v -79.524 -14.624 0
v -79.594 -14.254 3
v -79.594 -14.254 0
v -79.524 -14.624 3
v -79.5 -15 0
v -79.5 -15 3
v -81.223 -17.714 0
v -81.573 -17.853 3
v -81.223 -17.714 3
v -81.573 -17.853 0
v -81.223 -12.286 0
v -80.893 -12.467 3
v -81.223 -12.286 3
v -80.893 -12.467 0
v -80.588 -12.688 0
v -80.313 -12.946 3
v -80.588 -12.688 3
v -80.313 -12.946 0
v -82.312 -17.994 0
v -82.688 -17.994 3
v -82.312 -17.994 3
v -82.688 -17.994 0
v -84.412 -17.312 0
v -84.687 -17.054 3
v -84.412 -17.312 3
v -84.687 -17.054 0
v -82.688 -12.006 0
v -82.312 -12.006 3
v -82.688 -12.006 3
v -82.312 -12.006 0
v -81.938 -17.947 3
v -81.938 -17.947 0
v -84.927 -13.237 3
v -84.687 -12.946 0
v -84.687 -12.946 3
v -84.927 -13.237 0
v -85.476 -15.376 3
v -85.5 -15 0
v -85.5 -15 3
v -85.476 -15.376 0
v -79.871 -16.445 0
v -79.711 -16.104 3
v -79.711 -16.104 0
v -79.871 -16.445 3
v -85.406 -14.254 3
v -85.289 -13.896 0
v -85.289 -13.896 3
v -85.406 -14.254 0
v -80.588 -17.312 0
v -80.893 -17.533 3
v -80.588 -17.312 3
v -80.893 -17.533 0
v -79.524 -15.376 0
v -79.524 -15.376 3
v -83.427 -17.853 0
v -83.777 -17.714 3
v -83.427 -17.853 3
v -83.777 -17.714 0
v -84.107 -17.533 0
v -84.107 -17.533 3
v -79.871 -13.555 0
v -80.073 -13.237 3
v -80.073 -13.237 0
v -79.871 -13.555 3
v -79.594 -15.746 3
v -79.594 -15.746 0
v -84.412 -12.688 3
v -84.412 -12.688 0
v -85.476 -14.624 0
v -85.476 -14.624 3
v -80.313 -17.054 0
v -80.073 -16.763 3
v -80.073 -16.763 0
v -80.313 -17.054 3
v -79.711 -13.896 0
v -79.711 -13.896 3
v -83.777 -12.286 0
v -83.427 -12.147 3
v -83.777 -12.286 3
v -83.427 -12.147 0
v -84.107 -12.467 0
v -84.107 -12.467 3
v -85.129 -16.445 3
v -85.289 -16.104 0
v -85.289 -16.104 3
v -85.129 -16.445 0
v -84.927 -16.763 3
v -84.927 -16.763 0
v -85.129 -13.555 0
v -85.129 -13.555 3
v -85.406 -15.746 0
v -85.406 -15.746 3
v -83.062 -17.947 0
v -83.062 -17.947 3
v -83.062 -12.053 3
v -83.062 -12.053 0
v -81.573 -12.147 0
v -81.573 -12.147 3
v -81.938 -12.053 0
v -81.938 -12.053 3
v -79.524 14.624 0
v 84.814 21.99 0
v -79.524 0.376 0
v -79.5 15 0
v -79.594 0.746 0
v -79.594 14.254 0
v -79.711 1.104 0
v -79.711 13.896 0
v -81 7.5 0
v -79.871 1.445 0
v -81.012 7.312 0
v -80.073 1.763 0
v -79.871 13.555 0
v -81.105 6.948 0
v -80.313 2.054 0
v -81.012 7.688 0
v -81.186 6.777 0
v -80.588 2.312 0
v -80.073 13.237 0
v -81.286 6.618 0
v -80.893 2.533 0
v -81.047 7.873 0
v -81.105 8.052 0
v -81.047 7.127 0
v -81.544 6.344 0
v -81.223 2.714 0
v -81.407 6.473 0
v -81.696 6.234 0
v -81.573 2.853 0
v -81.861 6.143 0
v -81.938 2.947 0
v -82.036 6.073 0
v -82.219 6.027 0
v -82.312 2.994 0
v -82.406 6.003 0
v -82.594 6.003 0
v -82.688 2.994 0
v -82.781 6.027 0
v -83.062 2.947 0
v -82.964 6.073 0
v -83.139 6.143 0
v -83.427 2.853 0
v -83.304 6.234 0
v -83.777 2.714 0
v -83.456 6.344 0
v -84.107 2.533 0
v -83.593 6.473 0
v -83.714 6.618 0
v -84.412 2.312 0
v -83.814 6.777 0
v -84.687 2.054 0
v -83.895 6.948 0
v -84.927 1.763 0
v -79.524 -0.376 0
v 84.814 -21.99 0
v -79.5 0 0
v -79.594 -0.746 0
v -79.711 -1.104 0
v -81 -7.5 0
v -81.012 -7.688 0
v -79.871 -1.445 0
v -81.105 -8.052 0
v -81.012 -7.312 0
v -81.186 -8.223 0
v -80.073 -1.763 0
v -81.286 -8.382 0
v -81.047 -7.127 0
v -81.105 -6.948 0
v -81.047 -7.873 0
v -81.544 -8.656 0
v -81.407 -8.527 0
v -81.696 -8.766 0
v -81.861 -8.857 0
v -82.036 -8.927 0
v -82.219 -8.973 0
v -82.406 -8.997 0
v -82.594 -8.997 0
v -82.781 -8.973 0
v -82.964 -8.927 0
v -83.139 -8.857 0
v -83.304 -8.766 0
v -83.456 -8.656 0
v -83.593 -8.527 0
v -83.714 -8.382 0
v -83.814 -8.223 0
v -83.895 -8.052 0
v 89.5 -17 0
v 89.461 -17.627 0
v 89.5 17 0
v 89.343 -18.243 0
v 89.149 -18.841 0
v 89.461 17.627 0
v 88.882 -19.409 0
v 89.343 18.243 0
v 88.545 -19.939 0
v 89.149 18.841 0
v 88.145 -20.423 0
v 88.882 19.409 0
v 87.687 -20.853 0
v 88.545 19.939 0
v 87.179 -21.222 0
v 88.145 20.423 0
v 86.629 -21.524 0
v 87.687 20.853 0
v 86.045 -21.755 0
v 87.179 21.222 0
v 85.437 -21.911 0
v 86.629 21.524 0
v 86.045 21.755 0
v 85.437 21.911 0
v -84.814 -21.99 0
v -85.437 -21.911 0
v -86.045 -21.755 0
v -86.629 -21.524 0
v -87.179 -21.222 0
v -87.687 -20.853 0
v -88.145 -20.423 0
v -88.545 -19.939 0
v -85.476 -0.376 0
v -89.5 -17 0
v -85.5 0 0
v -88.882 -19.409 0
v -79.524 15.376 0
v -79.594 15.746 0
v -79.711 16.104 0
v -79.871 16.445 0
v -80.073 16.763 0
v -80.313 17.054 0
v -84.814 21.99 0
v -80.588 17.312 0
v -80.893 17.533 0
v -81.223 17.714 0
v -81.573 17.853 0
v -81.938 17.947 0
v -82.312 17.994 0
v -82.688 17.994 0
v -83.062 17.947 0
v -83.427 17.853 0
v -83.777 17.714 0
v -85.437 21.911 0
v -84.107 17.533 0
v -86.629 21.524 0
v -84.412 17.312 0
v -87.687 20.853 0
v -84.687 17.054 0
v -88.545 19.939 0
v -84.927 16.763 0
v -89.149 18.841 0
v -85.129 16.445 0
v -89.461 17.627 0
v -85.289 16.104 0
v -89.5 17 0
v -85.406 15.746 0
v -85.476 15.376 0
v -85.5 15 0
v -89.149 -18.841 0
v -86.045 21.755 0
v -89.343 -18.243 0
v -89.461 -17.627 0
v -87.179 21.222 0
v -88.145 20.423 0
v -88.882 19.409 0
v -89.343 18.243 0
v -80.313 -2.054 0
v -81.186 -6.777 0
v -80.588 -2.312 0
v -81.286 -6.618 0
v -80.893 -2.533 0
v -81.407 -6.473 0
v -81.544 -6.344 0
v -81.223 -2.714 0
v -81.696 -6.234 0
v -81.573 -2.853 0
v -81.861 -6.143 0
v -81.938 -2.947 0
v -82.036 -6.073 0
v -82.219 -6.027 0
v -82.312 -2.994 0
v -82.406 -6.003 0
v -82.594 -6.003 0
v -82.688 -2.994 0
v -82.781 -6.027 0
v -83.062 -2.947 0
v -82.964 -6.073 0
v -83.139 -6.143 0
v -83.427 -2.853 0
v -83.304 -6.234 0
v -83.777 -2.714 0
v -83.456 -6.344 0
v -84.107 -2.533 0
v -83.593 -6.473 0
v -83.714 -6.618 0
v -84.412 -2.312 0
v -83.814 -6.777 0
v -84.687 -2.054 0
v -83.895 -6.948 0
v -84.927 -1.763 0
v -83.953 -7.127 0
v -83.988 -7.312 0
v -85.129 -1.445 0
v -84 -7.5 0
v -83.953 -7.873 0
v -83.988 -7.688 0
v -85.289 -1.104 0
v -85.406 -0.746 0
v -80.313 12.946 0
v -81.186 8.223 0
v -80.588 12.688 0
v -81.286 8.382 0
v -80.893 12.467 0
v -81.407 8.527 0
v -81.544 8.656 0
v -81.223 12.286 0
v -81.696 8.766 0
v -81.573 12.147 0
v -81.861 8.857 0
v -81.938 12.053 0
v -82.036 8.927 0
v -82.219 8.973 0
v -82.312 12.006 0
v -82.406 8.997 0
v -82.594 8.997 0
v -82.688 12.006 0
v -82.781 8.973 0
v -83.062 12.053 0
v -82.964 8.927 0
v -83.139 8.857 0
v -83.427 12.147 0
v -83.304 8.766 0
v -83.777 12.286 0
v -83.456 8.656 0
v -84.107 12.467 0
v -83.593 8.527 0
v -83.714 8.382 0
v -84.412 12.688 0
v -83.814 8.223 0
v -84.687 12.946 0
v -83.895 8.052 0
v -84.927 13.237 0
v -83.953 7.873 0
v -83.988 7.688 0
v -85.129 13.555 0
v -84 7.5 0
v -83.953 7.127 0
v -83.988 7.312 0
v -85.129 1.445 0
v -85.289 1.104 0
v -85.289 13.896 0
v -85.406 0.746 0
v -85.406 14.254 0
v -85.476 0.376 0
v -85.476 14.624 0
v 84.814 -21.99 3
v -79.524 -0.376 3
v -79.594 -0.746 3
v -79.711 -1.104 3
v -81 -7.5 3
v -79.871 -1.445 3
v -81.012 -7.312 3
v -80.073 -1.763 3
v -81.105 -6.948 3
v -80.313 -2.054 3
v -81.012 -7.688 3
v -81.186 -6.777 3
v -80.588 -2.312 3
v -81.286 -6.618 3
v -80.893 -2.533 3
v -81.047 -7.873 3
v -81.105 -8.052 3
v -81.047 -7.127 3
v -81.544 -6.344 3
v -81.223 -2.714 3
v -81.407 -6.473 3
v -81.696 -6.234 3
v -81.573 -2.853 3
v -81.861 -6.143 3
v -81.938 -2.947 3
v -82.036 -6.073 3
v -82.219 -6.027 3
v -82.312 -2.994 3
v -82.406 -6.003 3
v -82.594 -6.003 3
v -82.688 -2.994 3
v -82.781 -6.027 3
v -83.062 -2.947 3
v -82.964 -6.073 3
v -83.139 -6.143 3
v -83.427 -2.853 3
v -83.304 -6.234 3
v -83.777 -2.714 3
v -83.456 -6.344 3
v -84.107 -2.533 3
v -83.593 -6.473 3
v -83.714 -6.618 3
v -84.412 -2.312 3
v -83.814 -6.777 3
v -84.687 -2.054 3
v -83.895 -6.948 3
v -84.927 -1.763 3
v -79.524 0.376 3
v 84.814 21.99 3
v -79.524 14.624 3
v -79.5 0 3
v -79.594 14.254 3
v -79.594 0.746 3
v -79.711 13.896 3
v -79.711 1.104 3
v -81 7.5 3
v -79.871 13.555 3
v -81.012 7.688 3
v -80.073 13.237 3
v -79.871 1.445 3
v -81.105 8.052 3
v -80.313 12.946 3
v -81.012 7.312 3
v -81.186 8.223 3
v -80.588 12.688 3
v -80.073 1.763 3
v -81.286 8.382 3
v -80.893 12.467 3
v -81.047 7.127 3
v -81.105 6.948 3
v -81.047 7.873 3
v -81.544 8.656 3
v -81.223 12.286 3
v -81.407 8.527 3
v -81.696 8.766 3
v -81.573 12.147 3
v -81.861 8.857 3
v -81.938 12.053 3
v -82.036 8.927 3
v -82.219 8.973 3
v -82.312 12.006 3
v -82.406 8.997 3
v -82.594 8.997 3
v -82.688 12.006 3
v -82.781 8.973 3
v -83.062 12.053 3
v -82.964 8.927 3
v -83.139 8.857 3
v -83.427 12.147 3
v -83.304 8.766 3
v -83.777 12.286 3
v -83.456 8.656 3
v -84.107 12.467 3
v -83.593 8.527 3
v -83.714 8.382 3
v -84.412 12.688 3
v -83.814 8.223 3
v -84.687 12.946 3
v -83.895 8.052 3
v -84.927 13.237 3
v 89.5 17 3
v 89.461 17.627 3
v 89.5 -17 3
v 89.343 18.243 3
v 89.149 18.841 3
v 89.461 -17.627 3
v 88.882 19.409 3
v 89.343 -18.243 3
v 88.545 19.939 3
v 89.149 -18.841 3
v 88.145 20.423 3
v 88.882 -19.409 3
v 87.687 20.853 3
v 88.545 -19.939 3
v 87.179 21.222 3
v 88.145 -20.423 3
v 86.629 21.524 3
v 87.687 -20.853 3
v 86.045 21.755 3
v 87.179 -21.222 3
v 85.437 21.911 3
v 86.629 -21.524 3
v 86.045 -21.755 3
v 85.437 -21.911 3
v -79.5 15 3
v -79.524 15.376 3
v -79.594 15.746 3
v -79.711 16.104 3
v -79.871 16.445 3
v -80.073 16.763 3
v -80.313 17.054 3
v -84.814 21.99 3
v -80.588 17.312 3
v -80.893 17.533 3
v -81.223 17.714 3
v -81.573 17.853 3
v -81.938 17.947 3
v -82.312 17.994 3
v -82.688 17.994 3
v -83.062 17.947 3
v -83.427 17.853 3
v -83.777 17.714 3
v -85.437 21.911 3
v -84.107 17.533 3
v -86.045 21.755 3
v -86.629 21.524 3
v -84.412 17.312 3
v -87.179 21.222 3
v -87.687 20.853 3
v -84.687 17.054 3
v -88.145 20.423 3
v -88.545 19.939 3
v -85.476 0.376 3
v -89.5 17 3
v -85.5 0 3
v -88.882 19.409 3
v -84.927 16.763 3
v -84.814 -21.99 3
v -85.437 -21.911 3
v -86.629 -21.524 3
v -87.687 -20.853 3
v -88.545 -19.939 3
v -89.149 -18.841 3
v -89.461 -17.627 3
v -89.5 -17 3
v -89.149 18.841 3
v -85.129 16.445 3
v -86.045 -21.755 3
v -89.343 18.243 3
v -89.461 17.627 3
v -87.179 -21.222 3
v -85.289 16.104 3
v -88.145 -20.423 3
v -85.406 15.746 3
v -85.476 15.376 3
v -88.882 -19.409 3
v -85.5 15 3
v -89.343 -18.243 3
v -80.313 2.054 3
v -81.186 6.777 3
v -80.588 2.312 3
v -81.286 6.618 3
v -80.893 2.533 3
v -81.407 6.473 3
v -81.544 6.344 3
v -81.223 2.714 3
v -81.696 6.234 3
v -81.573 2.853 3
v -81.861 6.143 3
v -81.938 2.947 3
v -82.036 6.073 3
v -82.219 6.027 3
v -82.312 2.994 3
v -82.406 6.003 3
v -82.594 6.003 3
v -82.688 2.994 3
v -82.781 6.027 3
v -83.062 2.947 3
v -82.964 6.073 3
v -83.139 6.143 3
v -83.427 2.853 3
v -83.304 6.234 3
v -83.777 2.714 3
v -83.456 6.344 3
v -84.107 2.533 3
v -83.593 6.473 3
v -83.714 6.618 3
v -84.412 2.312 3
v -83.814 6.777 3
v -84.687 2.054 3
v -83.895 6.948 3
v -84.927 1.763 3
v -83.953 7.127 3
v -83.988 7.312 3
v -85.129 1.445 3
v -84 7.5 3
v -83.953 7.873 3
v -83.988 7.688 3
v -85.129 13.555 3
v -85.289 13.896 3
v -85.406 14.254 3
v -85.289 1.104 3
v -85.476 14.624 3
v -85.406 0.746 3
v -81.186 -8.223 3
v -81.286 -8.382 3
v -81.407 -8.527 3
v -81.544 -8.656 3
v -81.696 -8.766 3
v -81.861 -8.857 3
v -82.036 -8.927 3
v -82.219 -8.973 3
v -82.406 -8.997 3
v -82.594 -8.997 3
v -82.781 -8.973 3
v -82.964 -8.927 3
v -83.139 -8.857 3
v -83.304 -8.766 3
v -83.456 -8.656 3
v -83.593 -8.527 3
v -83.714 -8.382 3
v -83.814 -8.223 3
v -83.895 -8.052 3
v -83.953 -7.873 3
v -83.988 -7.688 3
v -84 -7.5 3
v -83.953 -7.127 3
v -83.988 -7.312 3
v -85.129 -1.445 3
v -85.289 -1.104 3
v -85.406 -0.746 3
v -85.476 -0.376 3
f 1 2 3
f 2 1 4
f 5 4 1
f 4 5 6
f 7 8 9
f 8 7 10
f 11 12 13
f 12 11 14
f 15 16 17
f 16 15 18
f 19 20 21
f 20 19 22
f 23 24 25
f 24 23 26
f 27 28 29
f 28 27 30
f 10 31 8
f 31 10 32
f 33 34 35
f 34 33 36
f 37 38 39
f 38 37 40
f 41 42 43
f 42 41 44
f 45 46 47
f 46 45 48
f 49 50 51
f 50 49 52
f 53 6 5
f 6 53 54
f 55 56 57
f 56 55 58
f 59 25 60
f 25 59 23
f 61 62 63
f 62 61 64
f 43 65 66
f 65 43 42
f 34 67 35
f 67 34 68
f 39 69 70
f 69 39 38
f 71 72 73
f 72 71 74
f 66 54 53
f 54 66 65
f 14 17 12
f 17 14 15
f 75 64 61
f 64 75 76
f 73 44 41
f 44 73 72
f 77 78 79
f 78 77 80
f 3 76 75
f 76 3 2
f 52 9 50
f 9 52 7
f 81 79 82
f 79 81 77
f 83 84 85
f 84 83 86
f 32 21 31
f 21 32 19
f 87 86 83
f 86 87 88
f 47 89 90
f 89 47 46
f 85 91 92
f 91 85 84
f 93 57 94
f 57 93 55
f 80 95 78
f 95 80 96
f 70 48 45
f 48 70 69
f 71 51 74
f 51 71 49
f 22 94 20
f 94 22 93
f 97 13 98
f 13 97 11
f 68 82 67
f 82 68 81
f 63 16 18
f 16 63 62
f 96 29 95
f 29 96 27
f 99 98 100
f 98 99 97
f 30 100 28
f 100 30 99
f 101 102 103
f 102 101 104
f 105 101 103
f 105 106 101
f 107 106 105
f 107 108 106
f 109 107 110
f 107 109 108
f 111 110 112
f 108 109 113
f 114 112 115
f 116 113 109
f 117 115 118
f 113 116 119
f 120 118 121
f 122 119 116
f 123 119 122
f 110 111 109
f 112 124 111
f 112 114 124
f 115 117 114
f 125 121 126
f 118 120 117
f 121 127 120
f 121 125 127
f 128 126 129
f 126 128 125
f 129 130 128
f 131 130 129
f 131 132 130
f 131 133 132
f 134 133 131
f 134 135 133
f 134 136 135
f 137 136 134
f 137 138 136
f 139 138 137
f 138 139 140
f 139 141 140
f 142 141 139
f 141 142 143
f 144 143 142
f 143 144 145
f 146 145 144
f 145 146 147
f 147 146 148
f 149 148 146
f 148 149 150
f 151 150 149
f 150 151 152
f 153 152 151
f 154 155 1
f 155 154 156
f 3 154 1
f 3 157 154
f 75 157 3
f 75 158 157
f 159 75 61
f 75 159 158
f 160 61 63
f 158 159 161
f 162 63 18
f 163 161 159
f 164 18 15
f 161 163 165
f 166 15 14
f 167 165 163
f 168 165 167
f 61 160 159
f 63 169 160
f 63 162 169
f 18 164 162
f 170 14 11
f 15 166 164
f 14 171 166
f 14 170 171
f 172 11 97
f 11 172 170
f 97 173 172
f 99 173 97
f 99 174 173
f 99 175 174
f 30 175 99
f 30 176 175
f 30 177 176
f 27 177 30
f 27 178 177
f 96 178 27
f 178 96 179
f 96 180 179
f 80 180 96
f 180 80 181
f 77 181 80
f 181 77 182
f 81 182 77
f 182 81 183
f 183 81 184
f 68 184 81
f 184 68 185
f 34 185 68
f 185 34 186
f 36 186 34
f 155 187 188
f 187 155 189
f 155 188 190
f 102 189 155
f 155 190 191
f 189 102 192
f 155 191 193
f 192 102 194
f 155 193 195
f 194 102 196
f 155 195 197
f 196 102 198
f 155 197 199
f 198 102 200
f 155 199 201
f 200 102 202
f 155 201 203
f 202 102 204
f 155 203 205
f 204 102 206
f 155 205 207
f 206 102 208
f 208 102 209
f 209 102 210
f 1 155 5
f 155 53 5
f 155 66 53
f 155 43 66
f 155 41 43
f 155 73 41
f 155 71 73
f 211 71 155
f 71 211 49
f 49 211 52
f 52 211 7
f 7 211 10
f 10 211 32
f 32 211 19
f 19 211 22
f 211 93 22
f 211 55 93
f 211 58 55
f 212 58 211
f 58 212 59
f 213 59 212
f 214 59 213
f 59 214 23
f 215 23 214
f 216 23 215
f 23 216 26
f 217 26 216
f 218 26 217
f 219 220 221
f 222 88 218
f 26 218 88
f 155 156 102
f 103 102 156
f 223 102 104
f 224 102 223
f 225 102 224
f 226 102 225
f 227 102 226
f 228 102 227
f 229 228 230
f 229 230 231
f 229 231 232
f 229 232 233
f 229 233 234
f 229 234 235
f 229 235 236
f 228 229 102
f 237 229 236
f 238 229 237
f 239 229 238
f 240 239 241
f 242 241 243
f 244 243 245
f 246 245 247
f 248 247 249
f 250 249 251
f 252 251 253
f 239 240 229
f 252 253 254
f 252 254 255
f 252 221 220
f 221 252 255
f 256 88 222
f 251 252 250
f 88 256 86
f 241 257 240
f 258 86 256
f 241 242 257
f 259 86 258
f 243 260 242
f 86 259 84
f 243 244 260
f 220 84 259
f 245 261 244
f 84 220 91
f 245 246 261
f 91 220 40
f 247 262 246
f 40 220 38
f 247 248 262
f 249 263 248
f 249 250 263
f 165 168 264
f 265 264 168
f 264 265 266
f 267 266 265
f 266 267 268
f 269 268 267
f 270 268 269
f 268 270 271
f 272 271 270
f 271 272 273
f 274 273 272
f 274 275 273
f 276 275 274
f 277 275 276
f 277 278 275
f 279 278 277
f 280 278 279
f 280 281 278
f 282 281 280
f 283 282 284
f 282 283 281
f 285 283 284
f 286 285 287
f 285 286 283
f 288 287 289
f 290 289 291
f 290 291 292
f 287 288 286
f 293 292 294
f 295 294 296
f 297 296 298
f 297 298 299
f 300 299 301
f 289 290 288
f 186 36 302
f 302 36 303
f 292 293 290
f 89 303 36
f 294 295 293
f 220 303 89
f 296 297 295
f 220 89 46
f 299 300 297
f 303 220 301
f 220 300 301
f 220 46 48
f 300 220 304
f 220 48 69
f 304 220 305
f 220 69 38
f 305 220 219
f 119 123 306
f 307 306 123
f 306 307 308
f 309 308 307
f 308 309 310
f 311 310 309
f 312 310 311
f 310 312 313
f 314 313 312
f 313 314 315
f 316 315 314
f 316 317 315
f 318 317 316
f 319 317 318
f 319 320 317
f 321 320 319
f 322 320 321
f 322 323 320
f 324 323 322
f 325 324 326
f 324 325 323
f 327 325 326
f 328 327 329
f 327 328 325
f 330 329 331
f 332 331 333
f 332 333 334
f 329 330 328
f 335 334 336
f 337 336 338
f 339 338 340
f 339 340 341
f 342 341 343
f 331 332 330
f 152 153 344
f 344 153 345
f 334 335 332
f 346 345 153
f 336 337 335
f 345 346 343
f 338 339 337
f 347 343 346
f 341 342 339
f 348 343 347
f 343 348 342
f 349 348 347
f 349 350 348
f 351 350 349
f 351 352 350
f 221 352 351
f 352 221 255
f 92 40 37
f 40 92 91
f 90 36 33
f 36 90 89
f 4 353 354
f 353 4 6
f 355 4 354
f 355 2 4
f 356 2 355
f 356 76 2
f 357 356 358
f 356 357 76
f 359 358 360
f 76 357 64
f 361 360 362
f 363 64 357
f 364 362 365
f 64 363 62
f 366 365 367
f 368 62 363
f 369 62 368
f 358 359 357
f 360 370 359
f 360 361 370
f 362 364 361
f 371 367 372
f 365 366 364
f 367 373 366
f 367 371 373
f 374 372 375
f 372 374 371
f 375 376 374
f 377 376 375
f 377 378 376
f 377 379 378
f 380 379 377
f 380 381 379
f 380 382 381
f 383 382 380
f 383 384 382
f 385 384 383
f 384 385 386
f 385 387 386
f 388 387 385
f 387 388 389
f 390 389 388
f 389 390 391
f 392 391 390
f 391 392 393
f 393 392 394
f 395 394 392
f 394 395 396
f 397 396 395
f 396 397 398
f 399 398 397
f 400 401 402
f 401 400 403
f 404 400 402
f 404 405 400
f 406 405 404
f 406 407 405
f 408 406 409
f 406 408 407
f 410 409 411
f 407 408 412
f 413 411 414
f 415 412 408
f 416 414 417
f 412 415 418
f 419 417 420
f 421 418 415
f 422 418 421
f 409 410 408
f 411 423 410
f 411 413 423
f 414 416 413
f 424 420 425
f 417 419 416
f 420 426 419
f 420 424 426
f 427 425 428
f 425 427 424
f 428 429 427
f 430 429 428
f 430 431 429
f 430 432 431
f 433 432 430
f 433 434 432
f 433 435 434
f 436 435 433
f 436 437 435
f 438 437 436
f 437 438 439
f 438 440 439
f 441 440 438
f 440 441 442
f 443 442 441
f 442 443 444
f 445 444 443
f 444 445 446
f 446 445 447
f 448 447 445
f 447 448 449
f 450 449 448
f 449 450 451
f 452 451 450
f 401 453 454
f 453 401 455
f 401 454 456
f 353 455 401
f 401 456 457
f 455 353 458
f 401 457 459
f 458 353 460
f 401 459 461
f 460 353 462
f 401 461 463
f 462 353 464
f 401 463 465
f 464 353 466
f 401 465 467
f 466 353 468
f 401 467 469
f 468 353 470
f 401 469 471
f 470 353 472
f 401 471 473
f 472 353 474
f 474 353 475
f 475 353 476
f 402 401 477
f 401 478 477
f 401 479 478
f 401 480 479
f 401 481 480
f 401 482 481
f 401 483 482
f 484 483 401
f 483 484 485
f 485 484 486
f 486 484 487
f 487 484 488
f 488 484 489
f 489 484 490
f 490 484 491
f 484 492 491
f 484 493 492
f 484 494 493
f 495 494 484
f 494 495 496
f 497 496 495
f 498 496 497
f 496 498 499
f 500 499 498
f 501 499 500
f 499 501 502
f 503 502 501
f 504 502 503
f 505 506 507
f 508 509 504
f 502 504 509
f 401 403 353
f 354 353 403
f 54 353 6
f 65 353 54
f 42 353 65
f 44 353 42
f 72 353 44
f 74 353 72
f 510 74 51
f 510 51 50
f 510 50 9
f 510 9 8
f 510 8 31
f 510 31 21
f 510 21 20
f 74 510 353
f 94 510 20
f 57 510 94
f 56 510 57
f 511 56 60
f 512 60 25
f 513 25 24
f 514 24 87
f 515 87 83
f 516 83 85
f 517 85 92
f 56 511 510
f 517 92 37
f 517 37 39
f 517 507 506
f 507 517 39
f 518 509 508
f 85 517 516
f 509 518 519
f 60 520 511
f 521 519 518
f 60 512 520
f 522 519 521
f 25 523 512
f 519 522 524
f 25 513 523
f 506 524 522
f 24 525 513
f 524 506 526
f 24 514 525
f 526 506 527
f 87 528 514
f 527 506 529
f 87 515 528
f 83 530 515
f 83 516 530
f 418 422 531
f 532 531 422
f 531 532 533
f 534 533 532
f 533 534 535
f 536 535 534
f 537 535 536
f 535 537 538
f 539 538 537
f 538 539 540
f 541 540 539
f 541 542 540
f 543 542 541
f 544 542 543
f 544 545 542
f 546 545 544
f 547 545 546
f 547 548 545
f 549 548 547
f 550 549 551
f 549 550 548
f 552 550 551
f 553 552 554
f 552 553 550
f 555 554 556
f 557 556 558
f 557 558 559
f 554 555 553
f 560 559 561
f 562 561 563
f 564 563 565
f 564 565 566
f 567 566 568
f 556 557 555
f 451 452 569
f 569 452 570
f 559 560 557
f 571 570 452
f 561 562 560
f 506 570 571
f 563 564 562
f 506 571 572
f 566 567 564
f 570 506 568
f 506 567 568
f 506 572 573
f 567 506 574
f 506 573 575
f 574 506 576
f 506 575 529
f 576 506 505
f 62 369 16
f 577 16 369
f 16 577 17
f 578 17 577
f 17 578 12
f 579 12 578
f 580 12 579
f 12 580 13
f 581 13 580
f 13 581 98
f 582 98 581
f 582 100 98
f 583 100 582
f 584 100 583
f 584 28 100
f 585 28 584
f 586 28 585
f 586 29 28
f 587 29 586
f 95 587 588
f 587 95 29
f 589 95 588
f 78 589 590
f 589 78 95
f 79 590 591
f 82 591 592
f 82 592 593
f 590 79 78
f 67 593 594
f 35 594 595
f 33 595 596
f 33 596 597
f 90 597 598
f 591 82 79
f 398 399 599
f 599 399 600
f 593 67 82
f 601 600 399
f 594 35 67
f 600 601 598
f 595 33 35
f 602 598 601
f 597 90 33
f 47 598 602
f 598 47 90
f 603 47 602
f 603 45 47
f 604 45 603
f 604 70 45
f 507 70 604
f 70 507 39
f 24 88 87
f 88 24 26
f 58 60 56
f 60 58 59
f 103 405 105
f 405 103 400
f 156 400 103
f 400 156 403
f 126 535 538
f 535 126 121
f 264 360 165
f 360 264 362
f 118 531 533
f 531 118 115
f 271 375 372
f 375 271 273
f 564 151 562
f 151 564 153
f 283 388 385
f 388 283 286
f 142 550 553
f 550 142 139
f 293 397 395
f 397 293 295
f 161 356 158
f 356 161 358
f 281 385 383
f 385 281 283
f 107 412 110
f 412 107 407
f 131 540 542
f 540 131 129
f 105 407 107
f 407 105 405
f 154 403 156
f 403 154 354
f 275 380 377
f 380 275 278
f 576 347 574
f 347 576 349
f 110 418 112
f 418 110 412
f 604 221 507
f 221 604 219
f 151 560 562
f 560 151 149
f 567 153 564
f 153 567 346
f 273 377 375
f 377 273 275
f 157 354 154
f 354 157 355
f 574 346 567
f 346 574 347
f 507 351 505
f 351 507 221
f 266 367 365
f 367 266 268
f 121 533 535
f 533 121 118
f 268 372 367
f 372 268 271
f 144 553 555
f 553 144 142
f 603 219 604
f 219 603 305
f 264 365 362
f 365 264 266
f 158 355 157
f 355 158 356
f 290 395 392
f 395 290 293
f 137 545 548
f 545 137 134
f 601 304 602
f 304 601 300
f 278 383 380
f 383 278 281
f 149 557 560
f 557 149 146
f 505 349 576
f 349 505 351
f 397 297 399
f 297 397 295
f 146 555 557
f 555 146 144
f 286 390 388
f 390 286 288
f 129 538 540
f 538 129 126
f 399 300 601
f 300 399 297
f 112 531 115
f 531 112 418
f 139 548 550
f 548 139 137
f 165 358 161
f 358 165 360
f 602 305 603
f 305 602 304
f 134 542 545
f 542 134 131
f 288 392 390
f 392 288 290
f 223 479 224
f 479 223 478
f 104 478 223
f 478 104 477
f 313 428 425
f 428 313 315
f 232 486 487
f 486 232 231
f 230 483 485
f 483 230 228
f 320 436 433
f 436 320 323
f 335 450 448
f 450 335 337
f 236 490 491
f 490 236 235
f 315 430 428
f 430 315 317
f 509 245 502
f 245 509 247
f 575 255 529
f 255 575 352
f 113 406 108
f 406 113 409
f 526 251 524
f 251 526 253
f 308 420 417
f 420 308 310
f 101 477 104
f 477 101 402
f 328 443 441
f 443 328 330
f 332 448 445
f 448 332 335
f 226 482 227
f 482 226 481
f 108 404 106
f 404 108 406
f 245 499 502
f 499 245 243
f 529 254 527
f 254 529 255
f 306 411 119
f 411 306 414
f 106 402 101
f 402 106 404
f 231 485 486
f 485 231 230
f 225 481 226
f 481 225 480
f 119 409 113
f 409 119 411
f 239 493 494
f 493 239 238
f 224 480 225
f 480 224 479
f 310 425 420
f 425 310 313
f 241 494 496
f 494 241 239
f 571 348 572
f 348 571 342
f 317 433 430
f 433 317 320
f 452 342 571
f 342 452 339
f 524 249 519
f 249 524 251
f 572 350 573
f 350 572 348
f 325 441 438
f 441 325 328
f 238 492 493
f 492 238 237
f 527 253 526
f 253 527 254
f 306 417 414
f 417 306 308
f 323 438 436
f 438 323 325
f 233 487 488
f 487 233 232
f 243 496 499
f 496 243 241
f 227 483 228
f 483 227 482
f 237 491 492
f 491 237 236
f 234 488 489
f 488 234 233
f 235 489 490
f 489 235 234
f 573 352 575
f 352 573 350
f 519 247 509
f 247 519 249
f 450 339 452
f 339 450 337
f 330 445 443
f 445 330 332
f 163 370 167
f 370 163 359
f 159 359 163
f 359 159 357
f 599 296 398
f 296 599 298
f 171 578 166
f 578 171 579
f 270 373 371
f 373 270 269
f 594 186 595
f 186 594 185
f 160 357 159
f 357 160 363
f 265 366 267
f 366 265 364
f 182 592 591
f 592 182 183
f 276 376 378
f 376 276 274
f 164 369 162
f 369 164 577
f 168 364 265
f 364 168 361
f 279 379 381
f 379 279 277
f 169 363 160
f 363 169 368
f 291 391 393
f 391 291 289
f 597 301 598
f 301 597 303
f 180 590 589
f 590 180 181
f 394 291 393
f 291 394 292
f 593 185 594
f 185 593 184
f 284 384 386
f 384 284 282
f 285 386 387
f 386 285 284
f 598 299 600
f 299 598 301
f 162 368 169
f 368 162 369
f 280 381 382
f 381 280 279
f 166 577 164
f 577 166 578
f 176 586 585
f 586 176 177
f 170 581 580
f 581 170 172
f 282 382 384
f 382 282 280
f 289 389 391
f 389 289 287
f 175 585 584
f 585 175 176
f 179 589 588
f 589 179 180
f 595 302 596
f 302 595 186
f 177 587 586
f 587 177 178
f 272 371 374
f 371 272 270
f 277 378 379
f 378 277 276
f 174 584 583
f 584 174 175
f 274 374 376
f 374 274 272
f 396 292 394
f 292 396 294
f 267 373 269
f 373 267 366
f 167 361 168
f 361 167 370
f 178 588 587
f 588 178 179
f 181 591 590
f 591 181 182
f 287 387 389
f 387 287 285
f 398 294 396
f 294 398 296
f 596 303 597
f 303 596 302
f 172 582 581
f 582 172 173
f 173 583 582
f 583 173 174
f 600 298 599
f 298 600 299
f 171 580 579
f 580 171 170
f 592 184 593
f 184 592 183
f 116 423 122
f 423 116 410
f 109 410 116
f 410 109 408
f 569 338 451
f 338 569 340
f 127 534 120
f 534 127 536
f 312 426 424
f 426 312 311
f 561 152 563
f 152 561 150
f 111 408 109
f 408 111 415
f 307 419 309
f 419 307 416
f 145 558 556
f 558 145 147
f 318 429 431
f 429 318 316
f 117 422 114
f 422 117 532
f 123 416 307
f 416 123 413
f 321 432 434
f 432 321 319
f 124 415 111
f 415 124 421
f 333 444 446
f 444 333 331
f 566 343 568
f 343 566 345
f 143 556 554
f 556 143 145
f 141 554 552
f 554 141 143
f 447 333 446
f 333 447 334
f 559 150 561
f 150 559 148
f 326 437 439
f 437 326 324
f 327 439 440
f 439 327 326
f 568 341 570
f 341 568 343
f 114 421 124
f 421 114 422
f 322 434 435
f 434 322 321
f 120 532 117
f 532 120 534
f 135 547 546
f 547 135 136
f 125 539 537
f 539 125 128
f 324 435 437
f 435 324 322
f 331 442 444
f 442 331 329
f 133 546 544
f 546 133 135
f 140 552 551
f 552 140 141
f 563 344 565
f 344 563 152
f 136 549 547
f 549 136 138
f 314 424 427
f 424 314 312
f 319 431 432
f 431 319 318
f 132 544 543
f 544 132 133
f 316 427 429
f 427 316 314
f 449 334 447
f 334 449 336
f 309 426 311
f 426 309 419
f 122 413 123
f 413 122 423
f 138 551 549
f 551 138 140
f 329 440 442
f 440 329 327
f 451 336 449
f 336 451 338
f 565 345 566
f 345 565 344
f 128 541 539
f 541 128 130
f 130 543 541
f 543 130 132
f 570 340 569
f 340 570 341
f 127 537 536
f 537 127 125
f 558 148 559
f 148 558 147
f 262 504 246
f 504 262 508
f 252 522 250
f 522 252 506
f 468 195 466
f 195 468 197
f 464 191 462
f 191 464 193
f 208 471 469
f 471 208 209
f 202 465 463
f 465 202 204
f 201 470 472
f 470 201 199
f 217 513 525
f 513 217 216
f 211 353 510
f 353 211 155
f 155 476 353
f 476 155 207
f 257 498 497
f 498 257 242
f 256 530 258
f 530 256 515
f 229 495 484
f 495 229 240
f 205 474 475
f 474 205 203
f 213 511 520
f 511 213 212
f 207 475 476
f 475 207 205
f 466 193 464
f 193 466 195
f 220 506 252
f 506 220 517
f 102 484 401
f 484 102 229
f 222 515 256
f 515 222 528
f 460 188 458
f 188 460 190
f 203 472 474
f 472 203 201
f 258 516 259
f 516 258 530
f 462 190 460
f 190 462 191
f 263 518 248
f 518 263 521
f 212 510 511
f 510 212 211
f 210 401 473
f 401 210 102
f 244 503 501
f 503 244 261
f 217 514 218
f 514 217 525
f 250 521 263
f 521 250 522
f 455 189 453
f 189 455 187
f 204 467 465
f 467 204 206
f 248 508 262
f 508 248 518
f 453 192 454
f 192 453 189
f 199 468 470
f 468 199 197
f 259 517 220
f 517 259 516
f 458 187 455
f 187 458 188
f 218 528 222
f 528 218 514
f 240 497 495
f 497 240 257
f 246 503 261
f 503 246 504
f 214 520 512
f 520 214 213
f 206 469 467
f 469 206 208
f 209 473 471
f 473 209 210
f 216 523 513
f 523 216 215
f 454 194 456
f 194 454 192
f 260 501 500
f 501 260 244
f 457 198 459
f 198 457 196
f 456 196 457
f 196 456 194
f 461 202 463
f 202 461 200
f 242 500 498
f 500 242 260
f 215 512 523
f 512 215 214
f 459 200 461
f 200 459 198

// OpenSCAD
$fn = 50;


difference() {
	union() {
		hull() {
			translate(v = [-84.5000000000, 17.0000000000, 0]) {
				cylinder(h = 3, r = 5);
			}
			translate(v = [84.5000000000, 17.0000000000, 0]) {
				cylinder(h = 3, r = 5);
			}
			translate(v = [-84.5000000000, -17.0000000000, 0]) {
				cylinder(h = 3, r = 5);
			}
			translate(v = [84.5000000000, -17.0000000000, 0]) {
				cylinder(h = 3, r = 5);
			}
		}
	}
	union() {
		translate(v = [-82.5000000000, -15.0000000000, 0]) {
			cylinder(h = 3, r = 3.0000000000);
		}
		translate(v = [-82.5000000000, 0.0000000000, 0]) {
			cylinder(h = 3, r = 3.0000000000);
		}
		translate(v = [-82.5000000000, 15.0000000000, 0]) {
			cylinder(h = 3, r = 3.0000000000);
		}
		translate(v = [-82.5000000000, -15.0000000000, 0]) {
			cylinder(h = 3, r = 1.5000000000);
		}
		translate(v = [-82.5000000000, -7.5000000000, 0]) {
			cylinder(h = 3, r = 1.5000000000);
		}
		translate(v = [-82.5000000000, 0.0000000000, 0]) {
			cylinder(h = 3, r = 1.5000000000);
		}
		translate(v = [-82.5000000000, 7.5000000000, 0]) {
			cylinder(h = 3, r = 1.5000000000);
		}
		translate(v = [-82.5000000000, 15.0000000000, 0]) {
			cylinder(h = 3, r = 1.5000000000);
		}
		translate(v = [-82.5000000000, -15.0000000000, 0]) {
			cylinder(h = 3, r = 1.5000000000);
		}
		translate(v = [-82.5000000000, -7.5000000000, 0]) {
			cylinder(h = 3, r = 1.5000000000);
		}
		translate(v = [-82.5000000000, 0.0000000000, 0]) {
			cylinder(h = 3, r = 1.5000000000);
		}
		translate(v = [-82.5000000000, 7.5000000000, 0]) {
			cylinder(h = 3, r = 1.5000000000);
		}
		translate(v = [-82.5000000000, 15.0000000000, 0]) {
			cylinder(h = 3, r = 1.5000000000);
		}
		translate(v = [-82.5000000000, -15.0000000000, 0]) {
			cylinder(h = 3, r = 1.5000000000);
		}
		translate(v = [-82.5000000000, -7.5000000000, 0]) {
			cylinder(h = 3, r = 1.5000000000);
		}
		translate(v = [-82.5000000000, 0.0000000000, 0]) {
			cylinder(h = 3, r = 1.5000000000);
		}
		translate(v = [-82.5000000000, 7.5000000000, 0]) {
			cylinder(h = 3, r = 1.5000000000);
		}
		translate(v = [-82.5000000000, 15.0000000000, 0]) {
			cylinder(h = 3, r = 1.5000000000);
		}
	}
}
